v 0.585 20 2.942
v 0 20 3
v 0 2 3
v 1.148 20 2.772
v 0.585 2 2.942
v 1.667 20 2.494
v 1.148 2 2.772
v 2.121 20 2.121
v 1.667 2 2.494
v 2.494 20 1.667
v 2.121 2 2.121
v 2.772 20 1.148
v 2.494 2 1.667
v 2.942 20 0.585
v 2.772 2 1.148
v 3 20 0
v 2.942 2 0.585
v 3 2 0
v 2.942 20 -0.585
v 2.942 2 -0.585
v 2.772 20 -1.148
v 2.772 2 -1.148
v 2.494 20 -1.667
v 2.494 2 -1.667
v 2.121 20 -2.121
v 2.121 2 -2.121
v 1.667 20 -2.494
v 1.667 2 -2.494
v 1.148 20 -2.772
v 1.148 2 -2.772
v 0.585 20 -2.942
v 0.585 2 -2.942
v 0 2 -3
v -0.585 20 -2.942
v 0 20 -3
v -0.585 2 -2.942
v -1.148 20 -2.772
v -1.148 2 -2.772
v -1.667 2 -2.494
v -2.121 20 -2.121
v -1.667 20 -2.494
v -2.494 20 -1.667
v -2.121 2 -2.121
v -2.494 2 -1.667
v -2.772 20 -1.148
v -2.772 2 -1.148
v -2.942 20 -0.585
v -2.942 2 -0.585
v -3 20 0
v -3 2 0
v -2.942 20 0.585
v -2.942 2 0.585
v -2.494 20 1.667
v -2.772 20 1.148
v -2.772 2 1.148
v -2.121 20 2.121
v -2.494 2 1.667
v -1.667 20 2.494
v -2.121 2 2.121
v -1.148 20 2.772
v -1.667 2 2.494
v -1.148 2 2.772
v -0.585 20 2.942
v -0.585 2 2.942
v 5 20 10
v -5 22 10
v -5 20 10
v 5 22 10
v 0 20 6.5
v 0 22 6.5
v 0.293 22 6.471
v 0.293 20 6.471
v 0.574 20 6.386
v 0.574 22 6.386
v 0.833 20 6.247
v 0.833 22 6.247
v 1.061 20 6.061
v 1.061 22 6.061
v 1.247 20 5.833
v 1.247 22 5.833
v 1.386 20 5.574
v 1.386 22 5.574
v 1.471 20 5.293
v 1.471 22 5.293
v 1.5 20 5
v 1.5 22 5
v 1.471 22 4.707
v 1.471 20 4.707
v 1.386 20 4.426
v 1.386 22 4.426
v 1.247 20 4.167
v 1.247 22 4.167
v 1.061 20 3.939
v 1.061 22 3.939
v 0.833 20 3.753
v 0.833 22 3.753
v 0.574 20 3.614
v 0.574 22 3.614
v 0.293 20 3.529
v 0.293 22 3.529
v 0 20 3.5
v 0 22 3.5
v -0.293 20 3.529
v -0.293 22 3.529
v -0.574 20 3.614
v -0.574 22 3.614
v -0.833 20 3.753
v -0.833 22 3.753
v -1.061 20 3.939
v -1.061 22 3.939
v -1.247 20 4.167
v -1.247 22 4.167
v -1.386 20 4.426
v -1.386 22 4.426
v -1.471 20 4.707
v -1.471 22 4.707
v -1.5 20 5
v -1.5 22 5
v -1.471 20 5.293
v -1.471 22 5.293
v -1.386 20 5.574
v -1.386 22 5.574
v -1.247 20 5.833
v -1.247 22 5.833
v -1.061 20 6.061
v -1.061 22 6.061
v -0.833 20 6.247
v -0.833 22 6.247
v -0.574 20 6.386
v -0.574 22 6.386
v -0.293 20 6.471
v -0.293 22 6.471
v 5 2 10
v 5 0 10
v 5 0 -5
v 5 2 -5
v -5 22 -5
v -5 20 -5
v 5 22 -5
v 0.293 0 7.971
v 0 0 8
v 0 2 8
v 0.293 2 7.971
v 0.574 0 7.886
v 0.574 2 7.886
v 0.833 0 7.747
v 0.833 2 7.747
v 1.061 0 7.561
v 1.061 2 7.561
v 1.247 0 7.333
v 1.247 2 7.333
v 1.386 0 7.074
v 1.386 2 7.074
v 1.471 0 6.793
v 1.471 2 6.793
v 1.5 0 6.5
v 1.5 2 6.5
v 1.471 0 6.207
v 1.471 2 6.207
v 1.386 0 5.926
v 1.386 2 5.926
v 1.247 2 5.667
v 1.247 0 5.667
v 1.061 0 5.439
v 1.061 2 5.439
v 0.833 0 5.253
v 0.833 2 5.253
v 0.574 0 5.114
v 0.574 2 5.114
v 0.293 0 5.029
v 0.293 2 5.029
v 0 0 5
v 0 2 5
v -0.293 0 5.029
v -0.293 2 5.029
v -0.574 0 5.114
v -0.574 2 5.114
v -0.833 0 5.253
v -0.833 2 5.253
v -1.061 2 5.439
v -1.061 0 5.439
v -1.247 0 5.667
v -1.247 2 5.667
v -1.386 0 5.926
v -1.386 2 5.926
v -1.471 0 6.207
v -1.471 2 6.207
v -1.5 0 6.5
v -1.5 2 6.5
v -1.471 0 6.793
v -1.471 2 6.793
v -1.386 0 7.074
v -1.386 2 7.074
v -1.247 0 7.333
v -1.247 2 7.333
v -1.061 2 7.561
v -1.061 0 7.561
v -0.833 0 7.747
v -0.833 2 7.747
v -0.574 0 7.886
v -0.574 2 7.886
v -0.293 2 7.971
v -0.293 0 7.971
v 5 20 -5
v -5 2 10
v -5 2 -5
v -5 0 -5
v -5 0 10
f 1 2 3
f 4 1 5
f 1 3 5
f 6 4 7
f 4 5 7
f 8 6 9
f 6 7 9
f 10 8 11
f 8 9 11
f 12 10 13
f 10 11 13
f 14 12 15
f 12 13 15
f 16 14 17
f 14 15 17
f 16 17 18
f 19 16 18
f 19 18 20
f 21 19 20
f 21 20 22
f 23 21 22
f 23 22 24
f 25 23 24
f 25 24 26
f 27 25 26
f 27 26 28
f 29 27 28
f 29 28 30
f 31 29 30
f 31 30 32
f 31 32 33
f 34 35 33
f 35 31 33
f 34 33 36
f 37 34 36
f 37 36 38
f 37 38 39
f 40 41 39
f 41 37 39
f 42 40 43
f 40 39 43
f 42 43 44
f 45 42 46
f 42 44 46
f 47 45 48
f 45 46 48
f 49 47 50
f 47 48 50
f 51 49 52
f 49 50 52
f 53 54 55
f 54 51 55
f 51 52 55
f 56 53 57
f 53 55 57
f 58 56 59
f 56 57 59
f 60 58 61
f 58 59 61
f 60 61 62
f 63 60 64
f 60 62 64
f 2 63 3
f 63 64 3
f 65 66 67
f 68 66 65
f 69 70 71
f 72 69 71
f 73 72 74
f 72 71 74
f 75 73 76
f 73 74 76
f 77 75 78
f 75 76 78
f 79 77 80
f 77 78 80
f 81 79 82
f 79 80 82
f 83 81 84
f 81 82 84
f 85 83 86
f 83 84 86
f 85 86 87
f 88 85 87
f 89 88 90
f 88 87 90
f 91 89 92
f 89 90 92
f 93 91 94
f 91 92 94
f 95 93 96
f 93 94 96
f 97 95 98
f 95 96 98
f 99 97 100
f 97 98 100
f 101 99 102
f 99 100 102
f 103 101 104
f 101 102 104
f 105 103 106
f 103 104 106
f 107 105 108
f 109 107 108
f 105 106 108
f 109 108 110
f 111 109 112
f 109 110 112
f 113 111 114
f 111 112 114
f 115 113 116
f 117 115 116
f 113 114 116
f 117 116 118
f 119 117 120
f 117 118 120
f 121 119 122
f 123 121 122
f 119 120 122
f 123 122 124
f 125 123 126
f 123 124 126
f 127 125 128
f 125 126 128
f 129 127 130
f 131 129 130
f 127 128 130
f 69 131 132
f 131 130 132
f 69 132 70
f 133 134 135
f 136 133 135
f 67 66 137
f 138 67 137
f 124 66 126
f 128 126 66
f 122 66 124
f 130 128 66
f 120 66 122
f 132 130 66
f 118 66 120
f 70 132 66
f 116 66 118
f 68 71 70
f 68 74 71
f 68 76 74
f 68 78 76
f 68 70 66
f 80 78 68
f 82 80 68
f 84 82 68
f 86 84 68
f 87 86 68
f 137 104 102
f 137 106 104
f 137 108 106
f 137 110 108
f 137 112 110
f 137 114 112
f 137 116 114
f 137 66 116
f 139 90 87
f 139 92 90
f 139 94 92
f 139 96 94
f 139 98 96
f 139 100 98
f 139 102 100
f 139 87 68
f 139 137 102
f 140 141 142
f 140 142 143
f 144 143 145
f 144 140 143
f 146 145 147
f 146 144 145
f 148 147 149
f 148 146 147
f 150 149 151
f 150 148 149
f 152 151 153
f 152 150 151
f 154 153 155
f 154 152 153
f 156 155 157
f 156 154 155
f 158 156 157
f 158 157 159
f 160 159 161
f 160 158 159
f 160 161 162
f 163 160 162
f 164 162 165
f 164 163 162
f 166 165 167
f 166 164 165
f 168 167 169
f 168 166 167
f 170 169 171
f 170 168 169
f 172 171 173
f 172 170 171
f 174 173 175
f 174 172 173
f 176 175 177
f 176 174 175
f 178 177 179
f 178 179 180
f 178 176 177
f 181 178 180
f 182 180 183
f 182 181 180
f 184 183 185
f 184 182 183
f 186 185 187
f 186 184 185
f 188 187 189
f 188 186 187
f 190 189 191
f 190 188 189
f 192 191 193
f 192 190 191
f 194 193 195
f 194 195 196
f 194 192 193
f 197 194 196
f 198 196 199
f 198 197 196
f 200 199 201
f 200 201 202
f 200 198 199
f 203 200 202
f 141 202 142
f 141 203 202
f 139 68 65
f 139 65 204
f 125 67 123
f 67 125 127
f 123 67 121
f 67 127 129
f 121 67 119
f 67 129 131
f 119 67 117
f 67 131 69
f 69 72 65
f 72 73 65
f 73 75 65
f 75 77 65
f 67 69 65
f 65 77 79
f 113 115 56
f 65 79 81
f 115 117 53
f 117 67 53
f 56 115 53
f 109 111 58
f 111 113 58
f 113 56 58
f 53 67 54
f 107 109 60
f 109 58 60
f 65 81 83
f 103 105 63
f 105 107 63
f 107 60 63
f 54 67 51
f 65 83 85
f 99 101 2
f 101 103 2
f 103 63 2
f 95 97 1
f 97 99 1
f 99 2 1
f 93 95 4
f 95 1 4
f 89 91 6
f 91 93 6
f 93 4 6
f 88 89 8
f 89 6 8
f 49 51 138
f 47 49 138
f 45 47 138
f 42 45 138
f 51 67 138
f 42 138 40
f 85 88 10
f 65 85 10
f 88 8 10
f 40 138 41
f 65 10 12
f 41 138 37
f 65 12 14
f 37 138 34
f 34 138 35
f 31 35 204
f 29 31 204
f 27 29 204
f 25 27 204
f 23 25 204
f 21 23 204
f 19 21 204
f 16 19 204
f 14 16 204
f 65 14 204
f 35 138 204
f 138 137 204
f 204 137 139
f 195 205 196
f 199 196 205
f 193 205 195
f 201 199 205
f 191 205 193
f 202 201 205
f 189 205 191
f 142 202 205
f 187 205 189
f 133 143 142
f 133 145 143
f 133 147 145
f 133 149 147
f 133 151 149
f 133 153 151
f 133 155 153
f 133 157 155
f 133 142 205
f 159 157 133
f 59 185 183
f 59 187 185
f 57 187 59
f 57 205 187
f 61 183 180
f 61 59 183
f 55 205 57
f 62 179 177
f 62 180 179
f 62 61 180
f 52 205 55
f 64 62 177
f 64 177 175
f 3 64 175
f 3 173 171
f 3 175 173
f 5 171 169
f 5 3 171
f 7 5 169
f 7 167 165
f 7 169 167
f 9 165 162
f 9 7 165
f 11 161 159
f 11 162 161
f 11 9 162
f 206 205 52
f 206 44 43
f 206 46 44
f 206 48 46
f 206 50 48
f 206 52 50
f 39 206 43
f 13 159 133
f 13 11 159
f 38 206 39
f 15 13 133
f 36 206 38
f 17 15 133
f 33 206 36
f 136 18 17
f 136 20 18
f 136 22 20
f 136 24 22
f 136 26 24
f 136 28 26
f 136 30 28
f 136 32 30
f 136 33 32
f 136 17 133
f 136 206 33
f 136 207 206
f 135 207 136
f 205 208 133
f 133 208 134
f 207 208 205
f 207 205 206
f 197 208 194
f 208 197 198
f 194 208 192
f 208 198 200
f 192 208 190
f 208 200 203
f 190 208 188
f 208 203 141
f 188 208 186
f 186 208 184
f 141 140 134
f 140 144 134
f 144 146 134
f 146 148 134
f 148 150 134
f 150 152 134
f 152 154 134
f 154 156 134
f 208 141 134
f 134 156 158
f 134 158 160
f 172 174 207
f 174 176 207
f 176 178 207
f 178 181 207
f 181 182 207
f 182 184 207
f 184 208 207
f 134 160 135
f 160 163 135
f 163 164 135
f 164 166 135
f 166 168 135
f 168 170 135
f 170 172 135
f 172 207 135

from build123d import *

# Parameters (mm, degrees)
SKETCH_1_W      = 10
SKETCH_1_H      = 15
SKETCH_1_R      = 1.5
EXTRUDE_2_DEPTH = 2
SKETCH_2_R      = 3
EXTRUDE_3_DEPTH = 20
SKETCH_3_W      = 10
SKETCH_3_H      = 15
SKETCH_3_R      = 1.5
EXTRUDE_4_DEPTH = 2


with BuildPart() as part:
    # 草图1 → 凸台-拉伸2 (new body)
    with BuildSketch(Plane(origin=(0, 0, 0), x_dir=(1, 0, 0), z_dir=(0, 1, 0))):
        with Locations((0, -2.5)):
            Rectangle(SKETCH_1_W, SKETCH_1_H)
        with Locations(Location((0, -6.5, 0), (0, 0, 270))):
            Circle(SKETCH_1_R, mode=Mode.SUBTRACT)
    extrude(amount=EXTRUDE_2_DEPTH)

    # 草图2 → 凸台-拉伸3 (add)
    with BuildSketch(Plane(origin=(0, 2, 0), x_dir=(1, 0, 0), z_dir=(0, 1, 0))):
        with Locations(Location((0, 0, 0), (0, 0, 270))):
            Circle(SKETCH_2_R)
    extrude(amount=EXTRUDE_3_DEPTH)

    # 草图3 → 凸台-拉伸4 (add)
    with BuildSketch(Plane(origin=(0, 22, 0), x_dir=(1, 0, 0), z_dir=(0, 1, 0))):
        with Locations((0, -2.5)):
            Rectangle(SKETCH_3_W, SKETCH_3_H)
        with Locations(Location((0, -5, 0), (0, 0, 270))):
            Circle(SKETCH_3_R, mode=Mode.SUBTRACT)
    extrude(amount=-EXTRUDE_4_DEPTH)


solid = part.part
